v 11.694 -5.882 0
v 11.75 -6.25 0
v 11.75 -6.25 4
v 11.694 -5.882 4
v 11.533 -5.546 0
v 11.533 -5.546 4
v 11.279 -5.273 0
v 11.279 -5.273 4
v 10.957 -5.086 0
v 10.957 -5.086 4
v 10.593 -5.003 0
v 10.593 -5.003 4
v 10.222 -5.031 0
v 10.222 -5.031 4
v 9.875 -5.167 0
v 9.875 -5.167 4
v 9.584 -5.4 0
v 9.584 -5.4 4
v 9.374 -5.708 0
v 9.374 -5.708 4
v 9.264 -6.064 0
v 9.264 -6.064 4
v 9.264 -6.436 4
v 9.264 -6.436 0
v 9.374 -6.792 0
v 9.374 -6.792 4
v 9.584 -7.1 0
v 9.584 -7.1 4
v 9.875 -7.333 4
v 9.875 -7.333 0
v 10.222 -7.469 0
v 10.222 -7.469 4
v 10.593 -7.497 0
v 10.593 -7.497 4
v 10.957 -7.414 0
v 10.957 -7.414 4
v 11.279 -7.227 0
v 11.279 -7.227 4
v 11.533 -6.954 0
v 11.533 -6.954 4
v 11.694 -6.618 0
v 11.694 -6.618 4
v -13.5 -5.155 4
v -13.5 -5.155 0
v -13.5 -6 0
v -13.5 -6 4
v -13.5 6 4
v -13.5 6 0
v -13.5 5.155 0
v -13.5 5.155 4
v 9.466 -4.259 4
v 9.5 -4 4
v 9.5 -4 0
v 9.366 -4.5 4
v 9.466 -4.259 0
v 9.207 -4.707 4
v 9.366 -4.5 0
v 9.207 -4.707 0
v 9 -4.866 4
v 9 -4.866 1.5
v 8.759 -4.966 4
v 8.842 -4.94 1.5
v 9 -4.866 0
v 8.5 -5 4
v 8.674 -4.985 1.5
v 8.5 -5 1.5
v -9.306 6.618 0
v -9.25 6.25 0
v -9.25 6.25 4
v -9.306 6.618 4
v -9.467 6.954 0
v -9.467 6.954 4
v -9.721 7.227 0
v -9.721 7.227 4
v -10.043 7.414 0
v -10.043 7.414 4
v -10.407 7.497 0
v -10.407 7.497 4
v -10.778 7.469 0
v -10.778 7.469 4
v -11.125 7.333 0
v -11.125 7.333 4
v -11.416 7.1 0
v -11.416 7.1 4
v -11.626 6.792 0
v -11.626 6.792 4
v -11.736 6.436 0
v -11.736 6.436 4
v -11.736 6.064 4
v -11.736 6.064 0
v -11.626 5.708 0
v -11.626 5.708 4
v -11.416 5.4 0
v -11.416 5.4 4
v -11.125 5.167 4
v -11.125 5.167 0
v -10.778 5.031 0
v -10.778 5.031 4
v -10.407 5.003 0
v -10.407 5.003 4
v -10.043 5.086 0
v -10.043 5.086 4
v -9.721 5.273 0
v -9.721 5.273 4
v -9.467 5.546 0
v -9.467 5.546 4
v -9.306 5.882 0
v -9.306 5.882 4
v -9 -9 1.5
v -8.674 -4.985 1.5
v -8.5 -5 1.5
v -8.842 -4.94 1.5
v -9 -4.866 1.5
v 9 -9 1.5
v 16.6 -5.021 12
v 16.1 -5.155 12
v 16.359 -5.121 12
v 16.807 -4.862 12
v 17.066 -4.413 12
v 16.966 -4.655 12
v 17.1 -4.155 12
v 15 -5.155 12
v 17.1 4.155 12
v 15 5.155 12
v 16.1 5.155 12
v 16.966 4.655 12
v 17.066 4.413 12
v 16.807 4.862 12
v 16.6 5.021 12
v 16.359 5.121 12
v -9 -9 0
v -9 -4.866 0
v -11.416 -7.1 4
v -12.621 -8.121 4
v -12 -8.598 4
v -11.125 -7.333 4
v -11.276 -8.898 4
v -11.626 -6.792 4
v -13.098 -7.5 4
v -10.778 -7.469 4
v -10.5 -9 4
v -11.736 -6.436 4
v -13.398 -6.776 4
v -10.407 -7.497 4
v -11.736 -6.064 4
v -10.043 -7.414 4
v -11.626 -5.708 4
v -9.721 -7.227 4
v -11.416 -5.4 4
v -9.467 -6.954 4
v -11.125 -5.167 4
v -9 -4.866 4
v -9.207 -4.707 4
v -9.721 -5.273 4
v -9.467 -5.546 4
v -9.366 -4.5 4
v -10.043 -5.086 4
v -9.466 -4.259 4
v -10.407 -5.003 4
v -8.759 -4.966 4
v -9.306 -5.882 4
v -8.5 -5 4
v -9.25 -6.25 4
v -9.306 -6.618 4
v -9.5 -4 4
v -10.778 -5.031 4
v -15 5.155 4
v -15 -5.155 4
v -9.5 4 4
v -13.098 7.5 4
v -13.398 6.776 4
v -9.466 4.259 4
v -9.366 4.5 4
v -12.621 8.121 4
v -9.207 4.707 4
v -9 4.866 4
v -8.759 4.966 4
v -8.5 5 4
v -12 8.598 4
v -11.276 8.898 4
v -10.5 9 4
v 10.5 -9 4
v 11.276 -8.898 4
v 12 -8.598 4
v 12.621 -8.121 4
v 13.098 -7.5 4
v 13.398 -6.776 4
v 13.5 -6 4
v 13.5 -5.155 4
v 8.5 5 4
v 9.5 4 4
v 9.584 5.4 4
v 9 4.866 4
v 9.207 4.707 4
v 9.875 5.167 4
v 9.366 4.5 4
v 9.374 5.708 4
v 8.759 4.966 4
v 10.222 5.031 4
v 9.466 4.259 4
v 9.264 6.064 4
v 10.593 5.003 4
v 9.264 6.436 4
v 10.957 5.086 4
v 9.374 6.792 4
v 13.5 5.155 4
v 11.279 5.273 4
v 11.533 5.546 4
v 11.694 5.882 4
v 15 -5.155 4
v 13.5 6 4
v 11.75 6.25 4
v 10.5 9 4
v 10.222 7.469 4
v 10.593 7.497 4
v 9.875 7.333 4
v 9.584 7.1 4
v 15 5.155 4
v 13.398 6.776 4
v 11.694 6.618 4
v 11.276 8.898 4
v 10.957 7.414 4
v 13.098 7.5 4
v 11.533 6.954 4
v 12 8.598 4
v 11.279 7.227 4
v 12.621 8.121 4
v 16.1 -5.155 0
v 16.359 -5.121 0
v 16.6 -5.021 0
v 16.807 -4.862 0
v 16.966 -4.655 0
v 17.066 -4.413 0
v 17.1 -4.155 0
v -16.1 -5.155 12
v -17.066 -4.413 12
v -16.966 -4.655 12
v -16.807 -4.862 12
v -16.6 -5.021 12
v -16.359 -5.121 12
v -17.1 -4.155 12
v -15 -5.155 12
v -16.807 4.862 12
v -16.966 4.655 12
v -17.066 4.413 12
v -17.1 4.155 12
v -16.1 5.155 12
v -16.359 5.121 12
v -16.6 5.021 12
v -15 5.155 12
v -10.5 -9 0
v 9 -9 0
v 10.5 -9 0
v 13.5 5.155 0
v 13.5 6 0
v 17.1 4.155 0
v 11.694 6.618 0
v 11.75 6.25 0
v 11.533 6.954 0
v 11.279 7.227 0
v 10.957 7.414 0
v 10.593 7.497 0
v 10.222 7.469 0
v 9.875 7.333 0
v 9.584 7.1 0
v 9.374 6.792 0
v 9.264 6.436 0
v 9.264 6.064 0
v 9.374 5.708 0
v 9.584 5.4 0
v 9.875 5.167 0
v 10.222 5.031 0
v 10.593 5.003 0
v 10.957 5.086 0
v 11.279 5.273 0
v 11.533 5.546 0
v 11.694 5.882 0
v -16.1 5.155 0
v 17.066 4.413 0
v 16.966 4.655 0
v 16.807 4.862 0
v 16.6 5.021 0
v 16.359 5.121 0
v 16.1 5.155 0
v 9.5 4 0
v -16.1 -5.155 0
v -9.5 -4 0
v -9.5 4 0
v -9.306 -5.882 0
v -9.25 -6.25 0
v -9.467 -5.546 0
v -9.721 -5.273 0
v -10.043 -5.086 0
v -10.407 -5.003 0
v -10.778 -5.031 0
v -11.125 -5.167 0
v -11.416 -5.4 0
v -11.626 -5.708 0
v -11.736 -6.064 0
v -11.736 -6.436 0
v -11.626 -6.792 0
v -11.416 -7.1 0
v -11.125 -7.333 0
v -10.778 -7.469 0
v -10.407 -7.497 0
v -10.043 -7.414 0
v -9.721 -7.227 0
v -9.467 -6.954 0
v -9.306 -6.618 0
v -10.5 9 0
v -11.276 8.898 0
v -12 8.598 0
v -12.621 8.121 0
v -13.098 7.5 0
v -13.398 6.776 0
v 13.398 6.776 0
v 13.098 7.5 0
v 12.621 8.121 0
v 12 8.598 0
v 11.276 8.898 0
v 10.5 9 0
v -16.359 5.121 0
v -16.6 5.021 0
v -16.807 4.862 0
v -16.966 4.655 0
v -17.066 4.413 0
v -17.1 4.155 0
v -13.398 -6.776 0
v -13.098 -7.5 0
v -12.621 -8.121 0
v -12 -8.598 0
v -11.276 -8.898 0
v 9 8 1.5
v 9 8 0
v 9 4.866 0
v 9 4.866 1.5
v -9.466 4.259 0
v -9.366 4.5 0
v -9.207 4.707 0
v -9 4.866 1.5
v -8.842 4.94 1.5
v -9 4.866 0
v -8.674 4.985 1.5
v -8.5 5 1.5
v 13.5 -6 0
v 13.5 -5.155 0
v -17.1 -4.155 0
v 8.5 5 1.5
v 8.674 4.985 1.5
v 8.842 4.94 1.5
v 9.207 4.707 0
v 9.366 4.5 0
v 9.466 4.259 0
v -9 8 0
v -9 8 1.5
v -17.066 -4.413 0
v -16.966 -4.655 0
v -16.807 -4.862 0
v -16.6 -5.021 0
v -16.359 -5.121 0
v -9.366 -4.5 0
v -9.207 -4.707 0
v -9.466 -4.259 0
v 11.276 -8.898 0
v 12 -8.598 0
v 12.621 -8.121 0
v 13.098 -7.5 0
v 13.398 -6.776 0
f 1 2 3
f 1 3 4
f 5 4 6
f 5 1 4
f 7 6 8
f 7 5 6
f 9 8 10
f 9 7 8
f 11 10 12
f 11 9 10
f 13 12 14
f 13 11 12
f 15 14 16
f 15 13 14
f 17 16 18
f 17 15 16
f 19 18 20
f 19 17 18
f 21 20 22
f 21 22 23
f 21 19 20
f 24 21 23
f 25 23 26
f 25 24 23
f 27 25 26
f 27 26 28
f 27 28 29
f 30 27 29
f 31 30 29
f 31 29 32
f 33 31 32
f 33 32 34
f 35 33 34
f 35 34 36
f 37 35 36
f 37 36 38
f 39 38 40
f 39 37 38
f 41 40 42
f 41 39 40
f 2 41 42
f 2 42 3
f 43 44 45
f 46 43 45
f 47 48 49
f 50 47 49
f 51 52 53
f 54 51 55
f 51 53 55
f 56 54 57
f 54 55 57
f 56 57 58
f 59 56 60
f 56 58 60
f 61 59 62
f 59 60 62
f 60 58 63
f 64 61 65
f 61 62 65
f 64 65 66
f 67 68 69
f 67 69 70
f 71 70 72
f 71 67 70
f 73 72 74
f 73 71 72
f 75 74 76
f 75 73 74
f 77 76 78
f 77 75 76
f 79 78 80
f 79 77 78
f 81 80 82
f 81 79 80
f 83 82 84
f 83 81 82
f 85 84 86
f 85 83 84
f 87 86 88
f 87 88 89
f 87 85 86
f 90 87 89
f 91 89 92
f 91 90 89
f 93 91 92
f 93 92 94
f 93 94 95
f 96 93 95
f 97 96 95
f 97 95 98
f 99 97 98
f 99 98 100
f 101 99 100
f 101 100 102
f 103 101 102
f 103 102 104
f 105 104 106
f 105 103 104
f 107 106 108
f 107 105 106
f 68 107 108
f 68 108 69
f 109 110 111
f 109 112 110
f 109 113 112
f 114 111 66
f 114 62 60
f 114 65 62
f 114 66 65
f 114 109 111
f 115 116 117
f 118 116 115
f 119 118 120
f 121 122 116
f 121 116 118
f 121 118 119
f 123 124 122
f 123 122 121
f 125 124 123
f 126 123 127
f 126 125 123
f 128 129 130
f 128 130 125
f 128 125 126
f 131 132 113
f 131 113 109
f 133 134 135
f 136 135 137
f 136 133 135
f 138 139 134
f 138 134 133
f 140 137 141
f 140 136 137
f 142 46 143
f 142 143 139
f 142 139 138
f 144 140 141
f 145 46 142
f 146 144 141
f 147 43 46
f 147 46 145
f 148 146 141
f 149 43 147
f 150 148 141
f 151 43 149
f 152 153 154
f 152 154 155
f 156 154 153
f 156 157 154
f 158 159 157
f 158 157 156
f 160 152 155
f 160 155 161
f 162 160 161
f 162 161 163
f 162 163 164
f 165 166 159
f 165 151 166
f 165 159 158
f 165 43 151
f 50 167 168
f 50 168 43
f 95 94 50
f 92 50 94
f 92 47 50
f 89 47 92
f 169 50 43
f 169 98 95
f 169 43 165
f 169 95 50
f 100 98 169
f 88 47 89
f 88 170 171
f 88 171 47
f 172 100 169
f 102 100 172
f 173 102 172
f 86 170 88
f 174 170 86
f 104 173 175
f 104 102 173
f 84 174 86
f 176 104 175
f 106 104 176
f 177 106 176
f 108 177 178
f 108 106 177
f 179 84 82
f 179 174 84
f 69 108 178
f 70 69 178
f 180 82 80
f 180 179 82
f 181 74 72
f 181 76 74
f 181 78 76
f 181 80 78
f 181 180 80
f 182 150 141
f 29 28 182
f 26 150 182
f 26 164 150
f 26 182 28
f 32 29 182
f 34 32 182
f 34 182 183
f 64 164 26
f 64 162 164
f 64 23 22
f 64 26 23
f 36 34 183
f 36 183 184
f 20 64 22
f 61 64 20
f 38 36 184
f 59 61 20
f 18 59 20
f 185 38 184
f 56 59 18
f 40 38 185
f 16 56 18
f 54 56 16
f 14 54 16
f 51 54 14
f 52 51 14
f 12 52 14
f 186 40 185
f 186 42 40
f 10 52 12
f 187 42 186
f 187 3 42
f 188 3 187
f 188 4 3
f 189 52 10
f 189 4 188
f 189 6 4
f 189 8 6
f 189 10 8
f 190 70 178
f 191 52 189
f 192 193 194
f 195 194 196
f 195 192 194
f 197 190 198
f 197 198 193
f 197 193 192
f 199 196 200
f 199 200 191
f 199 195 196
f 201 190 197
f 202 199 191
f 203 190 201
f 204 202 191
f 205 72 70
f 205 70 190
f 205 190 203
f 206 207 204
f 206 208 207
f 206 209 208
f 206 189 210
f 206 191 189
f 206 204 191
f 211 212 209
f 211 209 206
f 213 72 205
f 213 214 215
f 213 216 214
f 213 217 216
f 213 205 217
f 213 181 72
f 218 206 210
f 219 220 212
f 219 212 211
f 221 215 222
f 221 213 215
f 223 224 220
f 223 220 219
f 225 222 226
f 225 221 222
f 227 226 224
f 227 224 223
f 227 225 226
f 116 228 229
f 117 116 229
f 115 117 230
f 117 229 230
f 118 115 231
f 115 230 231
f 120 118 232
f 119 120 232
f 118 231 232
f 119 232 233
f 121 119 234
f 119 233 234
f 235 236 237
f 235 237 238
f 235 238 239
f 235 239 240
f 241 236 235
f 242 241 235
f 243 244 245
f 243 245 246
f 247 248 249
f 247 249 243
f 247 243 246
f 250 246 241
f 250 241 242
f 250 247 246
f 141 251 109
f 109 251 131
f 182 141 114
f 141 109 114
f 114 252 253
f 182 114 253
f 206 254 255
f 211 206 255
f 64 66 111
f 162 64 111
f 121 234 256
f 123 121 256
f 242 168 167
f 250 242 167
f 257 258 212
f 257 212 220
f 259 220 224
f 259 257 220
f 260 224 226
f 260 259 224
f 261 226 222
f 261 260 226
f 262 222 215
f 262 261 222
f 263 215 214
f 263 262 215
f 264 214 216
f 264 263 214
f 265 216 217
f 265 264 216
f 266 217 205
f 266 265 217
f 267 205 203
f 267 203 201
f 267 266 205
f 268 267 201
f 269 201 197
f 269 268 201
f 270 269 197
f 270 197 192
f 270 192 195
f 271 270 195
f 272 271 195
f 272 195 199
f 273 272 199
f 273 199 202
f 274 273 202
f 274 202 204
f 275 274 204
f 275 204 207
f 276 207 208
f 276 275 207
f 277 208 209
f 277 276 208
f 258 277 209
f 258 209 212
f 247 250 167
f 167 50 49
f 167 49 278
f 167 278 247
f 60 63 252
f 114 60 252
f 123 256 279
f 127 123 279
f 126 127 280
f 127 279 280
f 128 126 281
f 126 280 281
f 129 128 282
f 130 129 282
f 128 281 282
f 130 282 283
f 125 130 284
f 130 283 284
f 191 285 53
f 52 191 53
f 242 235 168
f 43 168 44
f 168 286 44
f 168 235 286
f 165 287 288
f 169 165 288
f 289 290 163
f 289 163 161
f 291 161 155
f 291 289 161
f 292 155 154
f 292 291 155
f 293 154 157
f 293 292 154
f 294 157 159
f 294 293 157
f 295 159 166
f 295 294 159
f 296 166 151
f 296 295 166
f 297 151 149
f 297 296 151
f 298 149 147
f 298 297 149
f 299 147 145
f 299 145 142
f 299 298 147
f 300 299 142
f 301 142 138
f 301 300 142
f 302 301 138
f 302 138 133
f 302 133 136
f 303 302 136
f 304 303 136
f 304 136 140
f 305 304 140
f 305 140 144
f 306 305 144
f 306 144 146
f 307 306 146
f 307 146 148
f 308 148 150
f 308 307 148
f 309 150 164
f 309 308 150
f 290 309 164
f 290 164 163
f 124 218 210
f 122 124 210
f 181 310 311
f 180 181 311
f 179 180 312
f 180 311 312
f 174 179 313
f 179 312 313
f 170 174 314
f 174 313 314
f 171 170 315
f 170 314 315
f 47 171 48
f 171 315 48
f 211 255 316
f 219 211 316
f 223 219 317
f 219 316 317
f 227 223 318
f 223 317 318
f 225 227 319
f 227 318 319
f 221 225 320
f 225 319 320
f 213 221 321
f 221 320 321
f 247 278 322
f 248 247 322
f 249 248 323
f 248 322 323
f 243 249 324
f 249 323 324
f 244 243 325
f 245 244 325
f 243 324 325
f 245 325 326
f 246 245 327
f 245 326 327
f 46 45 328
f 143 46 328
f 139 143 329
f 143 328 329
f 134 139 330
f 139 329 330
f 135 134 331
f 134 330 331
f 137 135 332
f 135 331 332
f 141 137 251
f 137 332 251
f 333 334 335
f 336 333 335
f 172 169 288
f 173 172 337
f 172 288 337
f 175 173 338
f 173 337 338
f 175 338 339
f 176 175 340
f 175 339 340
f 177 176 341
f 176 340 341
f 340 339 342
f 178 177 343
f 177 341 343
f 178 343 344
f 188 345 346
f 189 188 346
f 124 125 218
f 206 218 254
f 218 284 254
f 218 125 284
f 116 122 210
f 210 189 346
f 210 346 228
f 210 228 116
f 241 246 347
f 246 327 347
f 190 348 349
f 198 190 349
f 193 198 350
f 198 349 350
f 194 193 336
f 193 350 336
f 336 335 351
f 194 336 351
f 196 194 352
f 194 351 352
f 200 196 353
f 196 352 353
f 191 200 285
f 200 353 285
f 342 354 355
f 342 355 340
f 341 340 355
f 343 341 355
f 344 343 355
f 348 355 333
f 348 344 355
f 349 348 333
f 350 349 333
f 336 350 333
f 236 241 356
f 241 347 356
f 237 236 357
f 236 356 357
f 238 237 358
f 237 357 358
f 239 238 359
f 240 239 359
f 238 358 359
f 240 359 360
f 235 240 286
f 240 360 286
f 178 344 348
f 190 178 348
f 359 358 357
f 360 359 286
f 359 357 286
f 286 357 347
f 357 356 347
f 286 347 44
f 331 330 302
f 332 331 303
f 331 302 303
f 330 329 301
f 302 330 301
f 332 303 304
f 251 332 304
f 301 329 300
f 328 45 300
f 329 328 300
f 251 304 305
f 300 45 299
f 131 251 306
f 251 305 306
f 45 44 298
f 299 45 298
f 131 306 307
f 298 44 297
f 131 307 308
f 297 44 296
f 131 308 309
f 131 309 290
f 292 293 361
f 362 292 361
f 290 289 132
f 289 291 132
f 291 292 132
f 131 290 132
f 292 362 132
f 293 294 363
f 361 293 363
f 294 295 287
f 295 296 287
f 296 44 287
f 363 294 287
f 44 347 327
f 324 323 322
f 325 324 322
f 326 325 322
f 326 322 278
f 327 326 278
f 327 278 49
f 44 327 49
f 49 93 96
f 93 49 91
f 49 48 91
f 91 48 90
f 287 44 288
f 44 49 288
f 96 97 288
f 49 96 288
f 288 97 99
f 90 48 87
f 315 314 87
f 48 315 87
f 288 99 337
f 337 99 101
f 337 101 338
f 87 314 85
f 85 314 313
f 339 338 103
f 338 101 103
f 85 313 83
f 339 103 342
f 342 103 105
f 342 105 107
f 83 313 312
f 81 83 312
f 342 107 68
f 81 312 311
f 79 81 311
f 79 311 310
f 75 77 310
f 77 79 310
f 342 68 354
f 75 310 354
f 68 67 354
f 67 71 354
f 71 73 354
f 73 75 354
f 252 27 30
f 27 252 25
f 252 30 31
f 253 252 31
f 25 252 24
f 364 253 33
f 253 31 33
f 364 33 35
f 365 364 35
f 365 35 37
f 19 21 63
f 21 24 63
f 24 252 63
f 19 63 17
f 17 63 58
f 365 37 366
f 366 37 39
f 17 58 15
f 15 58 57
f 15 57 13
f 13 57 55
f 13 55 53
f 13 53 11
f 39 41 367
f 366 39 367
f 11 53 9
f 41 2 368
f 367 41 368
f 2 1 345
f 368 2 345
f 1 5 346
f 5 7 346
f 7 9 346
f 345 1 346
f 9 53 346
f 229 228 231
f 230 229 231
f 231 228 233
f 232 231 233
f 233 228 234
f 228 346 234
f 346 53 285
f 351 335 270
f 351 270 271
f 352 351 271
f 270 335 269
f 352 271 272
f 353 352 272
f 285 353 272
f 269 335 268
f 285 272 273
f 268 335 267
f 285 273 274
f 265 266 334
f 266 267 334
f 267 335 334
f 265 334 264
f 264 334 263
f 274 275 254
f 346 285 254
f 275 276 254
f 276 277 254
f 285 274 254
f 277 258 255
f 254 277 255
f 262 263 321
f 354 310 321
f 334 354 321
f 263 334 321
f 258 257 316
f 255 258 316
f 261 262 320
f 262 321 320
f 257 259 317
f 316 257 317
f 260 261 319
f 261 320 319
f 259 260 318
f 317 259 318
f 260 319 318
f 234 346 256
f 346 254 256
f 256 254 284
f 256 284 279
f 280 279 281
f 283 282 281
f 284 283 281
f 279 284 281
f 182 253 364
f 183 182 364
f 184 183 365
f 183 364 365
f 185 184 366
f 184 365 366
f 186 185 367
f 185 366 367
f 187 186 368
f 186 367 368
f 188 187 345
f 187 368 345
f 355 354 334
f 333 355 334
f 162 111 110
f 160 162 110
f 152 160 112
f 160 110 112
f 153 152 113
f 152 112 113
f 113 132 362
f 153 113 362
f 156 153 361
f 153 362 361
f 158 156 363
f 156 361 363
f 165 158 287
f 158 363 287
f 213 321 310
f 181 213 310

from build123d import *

# Parameters (mm, degrees)
F0_R     = 1.25
F1_DEPTH = 4
F2_W     = 18
F2_H     = 17
F3_DEPTH = 1.5
F5_DEPTH = 8


with BuildPart() as f1:
    # F0 (on Top) → F1 (new body)
    with BuildSketch(Plane.XY):
        with BuildLine():
            Line((-10.5, -9), (10.5, -9))
            ThreePointArc((10.5, -9), (12.62132, -8.12132), (13.5, -6))
            Line((13.5, -6), (13.5, -5.154641))
            Line((13.5, -5.154641), (13.5, 5.154641))
            Line((13.5, 5.154641), (13.5, 6))
            ThreePointArc((13.5, 6), (12.62132, 8.12132), (10.5, 9))
            Line((10.5, 9), (-10.5, 9))
            ThreePointArc((-10.5, 9), (-12.62132, 8.12132), (-13.5, 6))
            Line((-13.5, 6), (-13.5, 5.154641))
            Line((-13.5, 5.154641), (-13.5, -5.154641))
            Line((-13.5, -5.154641), (-13.5, -6))
            ThreePointArc((-13.5, -6), (-12.62132, -8.12132), (-10.5, -9))
        make_face()
        with Locations((-10.5, -6.25)):
            Circle(F0_R, mode=Mode.SUBTRACT)
        with Locations((10.5, -6.25)):
            Circle(F0_R, mode=Mode.SUBTRACT)
        with Locations((-10.5, 6.25)):
            Circle(F0_R, mode=Mode.SUBTRACT)
        with BuildLine():
            ThreePointArc((9.5, -4), (9.207107, -4.707107), (8.5, -5))
            Line((8.5, -5), (-8.5, -5))
            ThreePointArc((-8.5, -5), (-9.207107, -4.707107), (-9.5, -4))
            Line((-9.5, -4), (-9.5, 4))
            ThreePointArc((-9.5, 4), (-9.207107, 4.707107), (-8.5, 5))
            Line((-8.5, 5), (8.5, 5))
            ThreePointArc((8.5, 5), (9.207107, 4.707107), (9.5, 4))
            Line((9.5, 4), (9.5, -4))
        make_face(mode=Mode.SUBTRACT)
        with Locations((10.5, 6.25)):
            Circle(F0_R, mode=Mode.SUBTRACT)
        with BuildLine():
            Line((13.5, 5.154641), (13.5, -5.154641))
            Line((13.5, -5.154641), (16.1, -5.154641))
            ThreePointArc((16.1, -5.154641), (16.807107, -4.861748), (17.1, -4.154641))
            Line((17.1, -4.154641), (17.1, 4.154641))
            ThreePointArc((17.1, 4.154641), (16.807107, 4.861748), (16.1, 5.154641))
            Line((16.1, 5.154641), (13.5, 5.154641))
        make_face()
        with BuildLine():
            Line((-16.1, -5.154641), (-13.5, -5.154641))
            Line((-13.5, -5.154641), (-13.5, 5.154641))
            Line((-13.5, 5.154641), (-16.1, 5.154641))
            ThreePointArc((-16.1, 5.154641), (-16.807107, 4.861748), (-17.1, 4.154641))
            Line((-17.1, 4.154641), (-17.1, -4.154641))
            ThreePointArc((-17.1, -4.154641), (-16.807107, -4.861748), (-16.1, -5.154641))
        make_face()
    extrude(amount=F1_DEPTH)

    # F2 (on face) → F3 (cut)
    with BuildSketch(Plane(origin=(0, 0, 0), x_dir=(1, 0, 0), z_dir=(0, 0, -1))):
        with Locations((0, 0.5)):
            Rectangle(F2_W, F2_H)
    extrude(amount=-F3_DEPTH, mode=Mode.SUBTRACT)

    # F4 (on face) → F5 (join)
    with BuildSketch(Plane.XY.offset(4)):
        with BuildLine():
            ThreePointArc((-16.1, 5.154641), (-16.807107, 4.861748), (-17.1, 4.154641))
            Line((-17.1, 4.154641), (-17.1, -4.154641))
            ThreePointArc((-17.1, -4.154641), (-16.807107, -4.861748), (-16.1, -5.154641))
            Line((-16.1, -5.154641), (-15, -5.154641))
            Line((-15, -5.154641), (-15, 5.154641))
            Line((-15, 5.154641), (-16.1, 5.154641))
        make_face()
        with BuildLine():
            ThreePointArc((17.1, 4.154641), (16.807107, 4.861748), (16.1, 5.154641))
            Line((16.1, 5.154641), (15, 5.154641))
            Line((15, 5.154641), (15, -5.154641))
            Line((15, -5.154641), (16.1, -5.154641))
            ThreePointArc((16.1, -5.154641), (16.807107, -4.861748), (17.1, -4.154641))
            Line((17.1, -4.154641), (17.1, 4.154641))
        make_face()
    extrude(amount=F5_DEPTH)


solid = f1.part
